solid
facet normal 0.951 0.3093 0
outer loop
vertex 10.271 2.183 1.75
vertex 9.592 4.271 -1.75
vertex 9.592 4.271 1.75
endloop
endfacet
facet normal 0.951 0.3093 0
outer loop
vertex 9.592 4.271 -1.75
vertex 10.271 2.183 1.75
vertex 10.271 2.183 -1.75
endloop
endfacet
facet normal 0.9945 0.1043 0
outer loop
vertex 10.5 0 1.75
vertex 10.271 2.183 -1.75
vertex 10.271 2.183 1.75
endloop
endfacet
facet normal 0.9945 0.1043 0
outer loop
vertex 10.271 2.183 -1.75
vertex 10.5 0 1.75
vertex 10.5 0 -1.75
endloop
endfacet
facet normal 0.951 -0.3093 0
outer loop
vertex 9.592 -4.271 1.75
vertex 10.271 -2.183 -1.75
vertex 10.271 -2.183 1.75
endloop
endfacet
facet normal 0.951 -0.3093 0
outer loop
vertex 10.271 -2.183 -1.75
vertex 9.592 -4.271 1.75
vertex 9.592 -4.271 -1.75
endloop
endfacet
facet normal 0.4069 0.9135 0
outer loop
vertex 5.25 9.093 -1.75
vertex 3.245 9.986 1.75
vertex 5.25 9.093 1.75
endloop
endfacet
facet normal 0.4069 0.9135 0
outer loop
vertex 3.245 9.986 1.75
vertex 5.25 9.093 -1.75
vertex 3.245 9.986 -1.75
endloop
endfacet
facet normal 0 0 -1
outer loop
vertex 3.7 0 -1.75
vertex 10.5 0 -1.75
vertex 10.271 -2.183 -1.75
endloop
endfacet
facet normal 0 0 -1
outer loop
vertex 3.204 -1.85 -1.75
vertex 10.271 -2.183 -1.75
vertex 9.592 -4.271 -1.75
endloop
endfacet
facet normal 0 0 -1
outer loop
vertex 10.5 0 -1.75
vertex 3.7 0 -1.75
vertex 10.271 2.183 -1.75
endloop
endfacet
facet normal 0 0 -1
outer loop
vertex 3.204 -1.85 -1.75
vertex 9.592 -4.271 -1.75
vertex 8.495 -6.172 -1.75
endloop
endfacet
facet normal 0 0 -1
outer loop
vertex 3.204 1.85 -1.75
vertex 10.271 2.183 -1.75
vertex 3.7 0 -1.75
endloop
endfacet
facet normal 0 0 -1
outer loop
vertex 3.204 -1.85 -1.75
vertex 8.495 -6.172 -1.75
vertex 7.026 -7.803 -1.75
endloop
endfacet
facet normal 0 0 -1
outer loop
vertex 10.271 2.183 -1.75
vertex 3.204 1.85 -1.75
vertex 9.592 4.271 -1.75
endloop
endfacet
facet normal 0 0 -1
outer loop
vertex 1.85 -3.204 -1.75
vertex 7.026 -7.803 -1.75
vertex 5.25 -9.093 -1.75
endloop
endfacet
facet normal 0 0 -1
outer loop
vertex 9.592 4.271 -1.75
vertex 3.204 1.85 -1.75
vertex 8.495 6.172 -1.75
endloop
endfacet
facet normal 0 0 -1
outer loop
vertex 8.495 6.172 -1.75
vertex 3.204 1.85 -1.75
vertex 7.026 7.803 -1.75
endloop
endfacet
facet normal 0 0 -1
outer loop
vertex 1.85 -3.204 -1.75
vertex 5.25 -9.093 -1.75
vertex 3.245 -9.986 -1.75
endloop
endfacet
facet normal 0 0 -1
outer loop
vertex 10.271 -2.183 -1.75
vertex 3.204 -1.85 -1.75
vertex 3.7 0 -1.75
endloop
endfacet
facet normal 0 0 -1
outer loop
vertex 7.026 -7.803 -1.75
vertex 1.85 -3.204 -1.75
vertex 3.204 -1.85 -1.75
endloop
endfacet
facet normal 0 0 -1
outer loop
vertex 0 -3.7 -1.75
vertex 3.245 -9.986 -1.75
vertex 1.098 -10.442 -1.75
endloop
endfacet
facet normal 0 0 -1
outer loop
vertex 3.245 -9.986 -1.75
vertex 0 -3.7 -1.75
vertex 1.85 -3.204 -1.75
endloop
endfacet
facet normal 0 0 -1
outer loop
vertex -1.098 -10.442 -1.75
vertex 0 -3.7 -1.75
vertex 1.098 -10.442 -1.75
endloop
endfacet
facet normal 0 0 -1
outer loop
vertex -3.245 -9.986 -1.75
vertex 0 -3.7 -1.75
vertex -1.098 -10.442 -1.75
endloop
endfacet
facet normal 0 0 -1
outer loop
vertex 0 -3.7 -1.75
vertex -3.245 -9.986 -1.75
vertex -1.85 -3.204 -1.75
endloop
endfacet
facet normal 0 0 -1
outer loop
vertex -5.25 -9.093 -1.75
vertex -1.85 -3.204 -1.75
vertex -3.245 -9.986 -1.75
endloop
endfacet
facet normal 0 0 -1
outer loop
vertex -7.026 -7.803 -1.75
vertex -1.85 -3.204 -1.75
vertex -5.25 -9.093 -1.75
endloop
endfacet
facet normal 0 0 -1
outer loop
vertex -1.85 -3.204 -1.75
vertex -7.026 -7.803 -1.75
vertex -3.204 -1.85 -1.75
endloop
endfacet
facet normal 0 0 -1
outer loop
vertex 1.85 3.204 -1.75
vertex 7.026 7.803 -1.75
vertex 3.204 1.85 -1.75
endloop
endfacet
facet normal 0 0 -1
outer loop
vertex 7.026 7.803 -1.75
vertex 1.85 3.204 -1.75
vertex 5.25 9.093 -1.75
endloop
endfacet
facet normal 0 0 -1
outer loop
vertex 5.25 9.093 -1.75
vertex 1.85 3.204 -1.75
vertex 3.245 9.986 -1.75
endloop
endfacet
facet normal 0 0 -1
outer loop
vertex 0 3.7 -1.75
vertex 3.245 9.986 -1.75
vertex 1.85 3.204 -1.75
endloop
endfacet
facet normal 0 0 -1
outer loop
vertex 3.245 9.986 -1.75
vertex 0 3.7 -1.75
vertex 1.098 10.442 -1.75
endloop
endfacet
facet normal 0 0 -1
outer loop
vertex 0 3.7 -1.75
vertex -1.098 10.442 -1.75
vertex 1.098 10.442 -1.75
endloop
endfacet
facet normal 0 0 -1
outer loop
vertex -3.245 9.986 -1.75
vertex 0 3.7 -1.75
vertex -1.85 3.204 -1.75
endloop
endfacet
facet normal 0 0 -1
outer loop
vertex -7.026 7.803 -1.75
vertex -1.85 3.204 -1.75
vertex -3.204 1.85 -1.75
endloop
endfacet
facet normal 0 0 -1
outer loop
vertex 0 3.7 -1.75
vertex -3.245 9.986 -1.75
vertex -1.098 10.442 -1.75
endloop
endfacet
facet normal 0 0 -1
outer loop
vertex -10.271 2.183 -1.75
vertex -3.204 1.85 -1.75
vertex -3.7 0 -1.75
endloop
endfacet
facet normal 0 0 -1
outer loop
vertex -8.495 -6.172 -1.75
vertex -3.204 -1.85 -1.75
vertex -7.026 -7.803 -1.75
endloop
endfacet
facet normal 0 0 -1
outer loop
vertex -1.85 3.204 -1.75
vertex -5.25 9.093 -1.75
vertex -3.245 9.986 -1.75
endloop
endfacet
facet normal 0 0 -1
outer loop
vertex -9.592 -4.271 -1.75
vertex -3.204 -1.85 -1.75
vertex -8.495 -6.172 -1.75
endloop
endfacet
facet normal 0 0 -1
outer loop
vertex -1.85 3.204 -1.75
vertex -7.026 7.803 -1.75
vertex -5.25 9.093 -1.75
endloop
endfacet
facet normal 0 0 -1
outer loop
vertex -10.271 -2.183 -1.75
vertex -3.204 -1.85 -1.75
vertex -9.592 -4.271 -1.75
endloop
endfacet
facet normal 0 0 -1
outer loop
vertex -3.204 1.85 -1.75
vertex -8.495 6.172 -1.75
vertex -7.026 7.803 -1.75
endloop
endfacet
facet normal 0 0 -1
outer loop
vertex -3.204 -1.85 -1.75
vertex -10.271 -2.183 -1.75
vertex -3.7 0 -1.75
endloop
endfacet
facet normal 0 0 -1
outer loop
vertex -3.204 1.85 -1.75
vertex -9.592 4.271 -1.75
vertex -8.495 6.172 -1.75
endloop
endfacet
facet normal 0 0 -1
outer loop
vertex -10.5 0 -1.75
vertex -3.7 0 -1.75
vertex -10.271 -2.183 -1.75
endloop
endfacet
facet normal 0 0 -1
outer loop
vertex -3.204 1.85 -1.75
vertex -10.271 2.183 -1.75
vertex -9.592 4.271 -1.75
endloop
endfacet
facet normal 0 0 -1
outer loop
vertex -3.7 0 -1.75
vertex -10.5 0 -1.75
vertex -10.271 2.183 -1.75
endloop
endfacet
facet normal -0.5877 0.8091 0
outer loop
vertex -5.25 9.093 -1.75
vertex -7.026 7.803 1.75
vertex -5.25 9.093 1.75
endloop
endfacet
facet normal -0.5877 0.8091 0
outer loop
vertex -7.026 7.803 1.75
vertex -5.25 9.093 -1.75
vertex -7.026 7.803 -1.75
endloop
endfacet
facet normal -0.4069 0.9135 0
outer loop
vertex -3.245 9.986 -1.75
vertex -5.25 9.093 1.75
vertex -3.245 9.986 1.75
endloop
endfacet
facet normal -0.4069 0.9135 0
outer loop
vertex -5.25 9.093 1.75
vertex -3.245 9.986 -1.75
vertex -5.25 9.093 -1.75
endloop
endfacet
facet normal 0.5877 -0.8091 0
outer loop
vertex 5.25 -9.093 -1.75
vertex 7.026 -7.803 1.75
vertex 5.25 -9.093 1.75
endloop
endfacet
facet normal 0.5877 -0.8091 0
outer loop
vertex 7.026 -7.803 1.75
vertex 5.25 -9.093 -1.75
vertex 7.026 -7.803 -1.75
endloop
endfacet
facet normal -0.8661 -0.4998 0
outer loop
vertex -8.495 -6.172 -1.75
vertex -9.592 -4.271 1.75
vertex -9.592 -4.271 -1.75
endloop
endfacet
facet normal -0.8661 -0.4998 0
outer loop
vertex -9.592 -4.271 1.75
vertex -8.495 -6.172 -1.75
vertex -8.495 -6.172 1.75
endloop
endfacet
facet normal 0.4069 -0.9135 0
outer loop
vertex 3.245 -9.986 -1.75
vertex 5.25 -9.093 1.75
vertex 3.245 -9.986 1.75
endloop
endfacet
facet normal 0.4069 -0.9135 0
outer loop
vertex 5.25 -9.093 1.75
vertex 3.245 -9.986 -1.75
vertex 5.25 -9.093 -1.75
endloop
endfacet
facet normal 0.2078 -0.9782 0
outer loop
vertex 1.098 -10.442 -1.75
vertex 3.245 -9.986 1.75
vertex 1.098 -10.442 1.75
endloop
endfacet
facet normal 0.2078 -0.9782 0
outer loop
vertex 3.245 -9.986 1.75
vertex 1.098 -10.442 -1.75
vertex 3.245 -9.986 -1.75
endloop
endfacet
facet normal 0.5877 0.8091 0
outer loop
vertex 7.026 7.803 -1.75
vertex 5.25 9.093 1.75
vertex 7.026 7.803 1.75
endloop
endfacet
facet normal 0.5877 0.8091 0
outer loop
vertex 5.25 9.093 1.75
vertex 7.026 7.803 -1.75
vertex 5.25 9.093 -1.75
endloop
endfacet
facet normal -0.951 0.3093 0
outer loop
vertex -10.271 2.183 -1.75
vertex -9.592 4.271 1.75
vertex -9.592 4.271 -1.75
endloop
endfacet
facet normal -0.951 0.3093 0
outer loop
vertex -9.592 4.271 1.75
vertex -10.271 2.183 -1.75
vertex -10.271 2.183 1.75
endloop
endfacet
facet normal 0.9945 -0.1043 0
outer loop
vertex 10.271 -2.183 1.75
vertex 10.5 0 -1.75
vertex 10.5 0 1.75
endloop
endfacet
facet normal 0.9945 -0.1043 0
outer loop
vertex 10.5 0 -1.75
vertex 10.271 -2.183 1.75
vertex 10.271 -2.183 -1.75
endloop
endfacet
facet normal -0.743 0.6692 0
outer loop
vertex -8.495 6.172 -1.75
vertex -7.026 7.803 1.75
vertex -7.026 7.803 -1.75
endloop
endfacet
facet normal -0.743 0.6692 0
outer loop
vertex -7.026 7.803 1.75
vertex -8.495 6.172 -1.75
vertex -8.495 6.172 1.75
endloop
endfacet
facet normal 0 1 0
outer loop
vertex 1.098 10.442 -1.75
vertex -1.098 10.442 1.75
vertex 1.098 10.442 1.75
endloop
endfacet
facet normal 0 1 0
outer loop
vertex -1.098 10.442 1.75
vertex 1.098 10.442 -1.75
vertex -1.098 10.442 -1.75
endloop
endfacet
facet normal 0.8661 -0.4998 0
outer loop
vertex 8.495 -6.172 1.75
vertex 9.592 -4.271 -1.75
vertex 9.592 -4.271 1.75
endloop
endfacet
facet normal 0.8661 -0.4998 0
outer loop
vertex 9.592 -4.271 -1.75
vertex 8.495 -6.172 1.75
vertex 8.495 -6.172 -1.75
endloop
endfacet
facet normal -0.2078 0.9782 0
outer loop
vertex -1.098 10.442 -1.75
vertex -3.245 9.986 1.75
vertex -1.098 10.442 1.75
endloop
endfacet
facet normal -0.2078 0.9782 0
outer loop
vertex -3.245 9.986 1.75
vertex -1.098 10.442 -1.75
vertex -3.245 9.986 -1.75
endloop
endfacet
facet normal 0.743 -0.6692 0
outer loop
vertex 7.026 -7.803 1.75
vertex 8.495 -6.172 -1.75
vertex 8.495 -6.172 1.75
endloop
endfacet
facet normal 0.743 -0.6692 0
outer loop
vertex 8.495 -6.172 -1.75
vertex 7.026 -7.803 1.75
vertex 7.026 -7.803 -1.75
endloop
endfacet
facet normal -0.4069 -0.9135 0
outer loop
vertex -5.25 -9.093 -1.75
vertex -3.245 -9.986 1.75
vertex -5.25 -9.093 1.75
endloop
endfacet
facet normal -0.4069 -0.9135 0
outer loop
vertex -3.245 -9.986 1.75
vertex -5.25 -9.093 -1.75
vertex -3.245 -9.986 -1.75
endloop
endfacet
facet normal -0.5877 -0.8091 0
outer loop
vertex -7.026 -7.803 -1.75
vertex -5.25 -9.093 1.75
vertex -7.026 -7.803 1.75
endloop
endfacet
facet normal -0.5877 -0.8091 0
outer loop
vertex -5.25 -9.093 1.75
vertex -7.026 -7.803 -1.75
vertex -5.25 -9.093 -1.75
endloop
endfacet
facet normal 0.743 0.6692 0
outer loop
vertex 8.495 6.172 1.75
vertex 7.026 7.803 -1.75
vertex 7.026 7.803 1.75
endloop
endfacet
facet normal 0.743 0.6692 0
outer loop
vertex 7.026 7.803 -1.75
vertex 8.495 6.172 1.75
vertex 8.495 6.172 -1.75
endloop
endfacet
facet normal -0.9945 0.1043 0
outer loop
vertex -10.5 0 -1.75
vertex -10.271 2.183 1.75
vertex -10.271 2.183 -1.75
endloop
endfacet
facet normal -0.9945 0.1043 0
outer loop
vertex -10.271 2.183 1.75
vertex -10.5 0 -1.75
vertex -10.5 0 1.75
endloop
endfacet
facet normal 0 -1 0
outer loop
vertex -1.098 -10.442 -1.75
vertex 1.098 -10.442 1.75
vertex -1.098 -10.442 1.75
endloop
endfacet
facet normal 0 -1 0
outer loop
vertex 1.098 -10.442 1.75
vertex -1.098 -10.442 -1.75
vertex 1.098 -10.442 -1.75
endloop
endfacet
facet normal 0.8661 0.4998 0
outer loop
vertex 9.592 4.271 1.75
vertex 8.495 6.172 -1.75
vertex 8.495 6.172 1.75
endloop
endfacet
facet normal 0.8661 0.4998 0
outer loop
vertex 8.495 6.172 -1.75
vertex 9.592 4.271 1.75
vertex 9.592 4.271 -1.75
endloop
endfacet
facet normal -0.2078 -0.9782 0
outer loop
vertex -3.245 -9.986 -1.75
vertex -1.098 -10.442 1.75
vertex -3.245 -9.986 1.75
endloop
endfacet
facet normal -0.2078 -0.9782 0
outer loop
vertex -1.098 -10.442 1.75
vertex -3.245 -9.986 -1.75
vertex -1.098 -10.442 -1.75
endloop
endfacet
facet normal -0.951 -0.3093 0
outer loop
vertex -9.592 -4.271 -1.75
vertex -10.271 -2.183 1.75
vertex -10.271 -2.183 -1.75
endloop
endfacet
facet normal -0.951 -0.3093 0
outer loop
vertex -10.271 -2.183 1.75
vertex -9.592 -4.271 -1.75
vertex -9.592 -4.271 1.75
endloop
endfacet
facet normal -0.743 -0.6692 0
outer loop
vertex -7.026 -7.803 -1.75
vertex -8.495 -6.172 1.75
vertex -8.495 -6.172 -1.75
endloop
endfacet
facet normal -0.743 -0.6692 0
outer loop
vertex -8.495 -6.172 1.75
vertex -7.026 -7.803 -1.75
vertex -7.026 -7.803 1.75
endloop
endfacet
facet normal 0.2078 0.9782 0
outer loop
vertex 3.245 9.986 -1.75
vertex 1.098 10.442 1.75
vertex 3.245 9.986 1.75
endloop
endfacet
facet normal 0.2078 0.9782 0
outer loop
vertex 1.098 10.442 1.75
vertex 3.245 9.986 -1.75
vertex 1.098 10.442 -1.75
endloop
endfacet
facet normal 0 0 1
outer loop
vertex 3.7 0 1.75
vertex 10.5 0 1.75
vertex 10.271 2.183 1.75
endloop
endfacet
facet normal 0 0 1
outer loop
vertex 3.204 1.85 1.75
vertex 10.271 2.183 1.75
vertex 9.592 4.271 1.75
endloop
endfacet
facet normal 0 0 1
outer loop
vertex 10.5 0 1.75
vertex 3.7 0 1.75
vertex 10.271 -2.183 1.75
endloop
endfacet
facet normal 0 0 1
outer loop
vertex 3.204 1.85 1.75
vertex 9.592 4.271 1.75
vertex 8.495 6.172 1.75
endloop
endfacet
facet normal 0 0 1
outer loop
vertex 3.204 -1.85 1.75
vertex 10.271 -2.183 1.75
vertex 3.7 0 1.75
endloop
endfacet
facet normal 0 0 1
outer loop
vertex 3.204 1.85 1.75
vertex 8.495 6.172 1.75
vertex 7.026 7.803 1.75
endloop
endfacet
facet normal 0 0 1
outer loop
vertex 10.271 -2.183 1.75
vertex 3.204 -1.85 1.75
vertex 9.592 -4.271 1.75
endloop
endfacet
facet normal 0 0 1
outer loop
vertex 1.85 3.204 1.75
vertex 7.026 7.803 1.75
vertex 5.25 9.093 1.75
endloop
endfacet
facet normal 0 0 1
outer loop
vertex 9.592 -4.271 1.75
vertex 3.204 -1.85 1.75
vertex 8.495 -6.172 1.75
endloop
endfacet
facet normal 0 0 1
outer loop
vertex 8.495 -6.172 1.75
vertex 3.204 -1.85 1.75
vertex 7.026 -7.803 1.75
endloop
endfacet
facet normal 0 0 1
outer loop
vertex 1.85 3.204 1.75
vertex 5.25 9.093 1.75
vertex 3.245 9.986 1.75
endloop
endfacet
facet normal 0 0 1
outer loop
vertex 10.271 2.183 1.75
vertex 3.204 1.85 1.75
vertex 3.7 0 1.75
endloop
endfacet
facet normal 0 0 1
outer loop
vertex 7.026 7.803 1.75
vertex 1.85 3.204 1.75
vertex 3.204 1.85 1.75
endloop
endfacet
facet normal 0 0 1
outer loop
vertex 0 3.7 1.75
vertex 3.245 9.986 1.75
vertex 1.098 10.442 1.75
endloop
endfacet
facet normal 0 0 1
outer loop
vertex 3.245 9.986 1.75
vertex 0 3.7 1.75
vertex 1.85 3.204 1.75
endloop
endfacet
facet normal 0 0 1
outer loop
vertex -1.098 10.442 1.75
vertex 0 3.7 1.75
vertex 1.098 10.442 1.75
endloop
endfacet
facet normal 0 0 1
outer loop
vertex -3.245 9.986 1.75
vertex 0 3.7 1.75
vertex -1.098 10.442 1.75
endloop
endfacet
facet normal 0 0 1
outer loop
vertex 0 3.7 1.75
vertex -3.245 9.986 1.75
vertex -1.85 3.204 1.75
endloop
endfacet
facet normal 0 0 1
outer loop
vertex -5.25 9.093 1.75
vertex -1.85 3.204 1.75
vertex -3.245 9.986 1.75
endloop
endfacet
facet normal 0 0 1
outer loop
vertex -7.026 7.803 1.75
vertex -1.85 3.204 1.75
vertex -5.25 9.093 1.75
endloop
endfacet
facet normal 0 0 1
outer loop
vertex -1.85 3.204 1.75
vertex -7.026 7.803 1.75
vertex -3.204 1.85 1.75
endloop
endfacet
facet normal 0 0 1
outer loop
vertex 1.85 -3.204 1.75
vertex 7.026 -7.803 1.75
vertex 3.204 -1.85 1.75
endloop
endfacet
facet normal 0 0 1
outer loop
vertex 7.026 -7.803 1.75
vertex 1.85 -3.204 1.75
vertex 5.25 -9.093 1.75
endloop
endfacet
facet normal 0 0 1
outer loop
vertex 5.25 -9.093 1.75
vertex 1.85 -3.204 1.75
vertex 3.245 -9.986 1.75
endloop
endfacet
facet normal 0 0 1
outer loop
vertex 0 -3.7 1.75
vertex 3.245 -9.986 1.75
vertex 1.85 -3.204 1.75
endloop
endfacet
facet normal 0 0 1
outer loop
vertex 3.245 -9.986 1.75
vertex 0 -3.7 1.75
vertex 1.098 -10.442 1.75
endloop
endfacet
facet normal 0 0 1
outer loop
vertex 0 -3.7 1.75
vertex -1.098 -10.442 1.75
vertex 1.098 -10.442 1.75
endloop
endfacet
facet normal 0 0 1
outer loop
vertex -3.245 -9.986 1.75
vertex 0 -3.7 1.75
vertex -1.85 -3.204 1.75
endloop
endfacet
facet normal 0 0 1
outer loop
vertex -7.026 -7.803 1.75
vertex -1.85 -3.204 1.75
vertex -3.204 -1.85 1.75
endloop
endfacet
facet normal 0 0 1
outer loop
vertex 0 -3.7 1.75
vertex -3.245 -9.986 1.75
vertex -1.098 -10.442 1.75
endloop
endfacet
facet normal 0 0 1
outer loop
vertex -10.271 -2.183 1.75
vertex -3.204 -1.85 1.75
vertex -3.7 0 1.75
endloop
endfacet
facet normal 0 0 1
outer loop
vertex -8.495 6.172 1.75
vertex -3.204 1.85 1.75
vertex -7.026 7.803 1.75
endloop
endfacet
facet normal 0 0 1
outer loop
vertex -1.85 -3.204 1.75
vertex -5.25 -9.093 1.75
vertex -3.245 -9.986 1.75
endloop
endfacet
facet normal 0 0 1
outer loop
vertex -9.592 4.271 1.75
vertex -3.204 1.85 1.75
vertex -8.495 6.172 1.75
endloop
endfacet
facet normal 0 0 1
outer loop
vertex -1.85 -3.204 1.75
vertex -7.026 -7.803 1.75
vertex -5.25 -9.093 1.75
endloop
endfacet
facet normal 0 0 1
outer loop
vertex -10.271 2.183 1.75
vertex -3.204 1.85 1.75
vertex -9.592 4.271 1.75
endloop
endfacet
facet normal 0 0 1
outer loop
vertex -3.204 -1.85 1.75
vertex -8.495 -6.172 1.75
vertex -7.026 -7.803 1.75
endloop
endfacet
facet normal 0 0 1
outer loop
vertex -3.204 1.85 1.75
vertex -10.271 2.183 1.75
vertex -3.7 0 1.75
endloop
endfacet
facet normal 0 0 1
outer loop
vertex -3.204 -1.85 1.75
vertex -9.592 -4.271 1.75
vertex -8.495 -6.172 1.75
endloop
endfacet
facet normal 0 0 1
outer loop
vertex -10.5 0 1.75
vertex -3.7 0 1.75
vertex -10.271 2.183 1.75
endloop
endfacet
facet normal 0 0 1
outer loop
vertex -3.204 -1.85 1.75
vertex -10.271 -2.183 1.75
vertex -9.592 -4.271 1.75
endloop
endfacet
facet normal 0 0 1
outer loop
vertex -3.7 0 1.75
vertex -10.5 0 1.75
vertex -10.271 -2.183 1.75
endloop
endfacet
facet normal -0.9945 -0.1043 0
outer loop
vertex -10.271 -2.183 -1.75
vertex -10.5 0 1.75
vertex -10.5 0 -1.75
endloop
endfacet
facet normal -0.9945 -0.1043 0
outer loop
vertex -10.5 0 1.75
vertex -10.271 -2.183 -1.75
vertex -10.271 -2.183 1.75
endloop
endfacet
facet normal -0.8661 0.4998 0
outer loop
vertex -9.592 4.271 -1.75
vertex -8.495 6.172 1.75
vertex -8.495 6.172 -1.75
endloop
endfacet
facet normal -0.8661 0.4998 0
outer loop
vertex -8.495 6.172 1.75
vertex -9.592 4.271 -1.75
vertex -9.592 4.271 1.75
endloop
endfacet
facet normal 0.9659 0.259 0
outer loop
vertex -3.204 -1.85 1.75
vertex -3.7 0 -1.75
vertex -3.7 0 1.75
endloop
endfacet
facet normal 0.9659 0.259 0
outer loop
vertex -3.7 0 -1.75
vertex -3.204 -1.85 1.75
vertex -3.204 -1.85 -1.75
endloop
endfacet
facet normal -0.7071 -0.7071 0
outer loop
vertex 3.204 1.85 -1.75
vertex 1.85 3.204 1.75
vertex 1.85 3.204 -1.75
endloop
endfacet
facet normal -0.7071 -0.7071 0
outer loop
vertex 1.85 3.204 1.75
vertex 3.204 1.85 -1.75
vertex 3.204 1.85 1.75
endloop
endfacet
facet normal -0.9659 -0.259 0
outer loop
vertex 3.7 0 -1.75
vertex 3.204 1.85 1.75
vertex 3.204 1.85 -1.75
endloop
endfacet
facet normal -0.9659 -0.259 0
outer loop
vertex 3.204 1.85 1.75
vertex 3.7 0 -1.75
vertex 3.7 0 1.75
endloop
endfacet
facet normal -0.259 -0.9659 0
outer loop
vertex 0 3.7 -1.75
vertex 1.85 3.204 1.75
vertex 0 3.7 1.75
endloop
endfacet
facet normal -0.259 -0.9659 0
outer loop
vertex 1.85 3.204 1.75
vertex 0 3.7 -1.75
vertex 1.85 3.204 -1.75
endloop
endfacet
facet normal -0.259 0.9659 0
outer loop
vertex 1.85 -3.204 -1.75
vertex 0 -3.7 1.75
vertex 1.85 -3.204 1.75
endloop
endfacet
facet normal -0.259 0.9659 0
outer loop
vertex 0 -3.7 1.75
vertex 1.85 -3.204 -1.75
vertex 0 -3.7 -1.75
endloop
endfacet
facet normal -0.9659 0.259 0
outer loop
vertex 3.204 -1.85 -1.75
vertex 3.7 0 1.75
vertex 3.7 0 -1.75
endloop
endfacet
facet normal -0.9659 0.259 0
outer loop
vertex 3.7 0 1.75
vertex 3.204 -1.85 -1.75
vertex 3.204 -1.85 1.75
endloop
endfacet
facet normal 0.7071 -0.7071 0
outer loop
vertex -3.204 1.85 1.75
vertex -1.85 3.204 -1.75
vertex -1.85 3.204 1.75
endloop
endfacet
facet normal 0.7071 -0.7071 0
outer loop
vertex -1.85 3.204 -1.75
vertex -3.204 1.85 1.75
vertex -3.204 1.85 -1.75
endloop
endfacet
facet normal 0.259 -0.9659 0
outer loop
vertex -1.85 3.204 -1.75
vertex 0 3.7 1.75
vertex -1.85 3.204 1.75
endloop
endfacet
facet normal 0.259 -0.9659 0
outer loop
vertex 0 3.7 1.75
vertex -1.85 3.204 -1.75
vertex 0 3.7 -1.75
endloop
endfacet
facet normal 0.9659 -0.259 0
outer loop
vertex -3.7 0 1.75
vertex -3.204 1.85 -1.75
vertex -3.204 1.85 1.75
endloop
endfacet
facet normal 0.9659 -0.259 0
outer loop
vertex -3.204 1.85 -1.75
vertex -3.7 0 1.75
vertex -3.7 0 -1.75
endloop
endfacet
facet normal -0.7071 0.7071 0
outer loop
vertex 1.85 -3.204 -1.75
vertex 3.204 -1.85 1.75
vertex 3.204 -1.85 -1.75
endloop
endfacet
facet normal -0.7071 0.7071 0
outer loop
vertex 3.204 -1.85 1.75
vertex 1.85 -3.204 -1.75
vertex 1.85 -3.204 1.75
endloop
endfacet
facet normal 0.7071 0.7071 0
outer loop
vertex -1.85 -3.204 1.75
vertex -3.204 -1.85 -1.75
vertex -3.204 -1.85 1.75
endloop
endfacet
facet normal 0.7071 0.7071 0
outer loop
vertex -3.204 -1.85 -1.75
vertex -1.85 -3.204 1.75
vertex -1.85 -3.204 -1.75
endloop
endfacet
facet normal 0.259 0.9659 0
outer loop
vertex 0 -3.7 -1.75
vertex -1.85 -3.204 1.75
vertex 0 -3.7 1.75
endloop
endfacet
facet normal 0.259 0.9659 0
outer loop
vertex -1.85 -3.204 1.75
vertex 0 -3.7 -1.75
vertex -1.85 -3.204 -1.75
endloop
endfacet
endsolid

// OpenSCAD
// Parameters
outer_radius = 10.5; //[5.25:21:0.1]
inner_radius = 3.7; //[1.85:7.4:0.1]
thickness = 3.5; //[1.75:7:0.1]

// Geometry
module radial_outer_cyl() {
  cylinder(r=outer_radius, h=thickness, center=true);
}

module radial_inner_hole_cyl() {
  cylinder(r=inner_radius, h=thickness, center=true);
}

// Final Output
difference() {
  radial_outer_cyl();
  radial_inner_hole_cyl();
}
